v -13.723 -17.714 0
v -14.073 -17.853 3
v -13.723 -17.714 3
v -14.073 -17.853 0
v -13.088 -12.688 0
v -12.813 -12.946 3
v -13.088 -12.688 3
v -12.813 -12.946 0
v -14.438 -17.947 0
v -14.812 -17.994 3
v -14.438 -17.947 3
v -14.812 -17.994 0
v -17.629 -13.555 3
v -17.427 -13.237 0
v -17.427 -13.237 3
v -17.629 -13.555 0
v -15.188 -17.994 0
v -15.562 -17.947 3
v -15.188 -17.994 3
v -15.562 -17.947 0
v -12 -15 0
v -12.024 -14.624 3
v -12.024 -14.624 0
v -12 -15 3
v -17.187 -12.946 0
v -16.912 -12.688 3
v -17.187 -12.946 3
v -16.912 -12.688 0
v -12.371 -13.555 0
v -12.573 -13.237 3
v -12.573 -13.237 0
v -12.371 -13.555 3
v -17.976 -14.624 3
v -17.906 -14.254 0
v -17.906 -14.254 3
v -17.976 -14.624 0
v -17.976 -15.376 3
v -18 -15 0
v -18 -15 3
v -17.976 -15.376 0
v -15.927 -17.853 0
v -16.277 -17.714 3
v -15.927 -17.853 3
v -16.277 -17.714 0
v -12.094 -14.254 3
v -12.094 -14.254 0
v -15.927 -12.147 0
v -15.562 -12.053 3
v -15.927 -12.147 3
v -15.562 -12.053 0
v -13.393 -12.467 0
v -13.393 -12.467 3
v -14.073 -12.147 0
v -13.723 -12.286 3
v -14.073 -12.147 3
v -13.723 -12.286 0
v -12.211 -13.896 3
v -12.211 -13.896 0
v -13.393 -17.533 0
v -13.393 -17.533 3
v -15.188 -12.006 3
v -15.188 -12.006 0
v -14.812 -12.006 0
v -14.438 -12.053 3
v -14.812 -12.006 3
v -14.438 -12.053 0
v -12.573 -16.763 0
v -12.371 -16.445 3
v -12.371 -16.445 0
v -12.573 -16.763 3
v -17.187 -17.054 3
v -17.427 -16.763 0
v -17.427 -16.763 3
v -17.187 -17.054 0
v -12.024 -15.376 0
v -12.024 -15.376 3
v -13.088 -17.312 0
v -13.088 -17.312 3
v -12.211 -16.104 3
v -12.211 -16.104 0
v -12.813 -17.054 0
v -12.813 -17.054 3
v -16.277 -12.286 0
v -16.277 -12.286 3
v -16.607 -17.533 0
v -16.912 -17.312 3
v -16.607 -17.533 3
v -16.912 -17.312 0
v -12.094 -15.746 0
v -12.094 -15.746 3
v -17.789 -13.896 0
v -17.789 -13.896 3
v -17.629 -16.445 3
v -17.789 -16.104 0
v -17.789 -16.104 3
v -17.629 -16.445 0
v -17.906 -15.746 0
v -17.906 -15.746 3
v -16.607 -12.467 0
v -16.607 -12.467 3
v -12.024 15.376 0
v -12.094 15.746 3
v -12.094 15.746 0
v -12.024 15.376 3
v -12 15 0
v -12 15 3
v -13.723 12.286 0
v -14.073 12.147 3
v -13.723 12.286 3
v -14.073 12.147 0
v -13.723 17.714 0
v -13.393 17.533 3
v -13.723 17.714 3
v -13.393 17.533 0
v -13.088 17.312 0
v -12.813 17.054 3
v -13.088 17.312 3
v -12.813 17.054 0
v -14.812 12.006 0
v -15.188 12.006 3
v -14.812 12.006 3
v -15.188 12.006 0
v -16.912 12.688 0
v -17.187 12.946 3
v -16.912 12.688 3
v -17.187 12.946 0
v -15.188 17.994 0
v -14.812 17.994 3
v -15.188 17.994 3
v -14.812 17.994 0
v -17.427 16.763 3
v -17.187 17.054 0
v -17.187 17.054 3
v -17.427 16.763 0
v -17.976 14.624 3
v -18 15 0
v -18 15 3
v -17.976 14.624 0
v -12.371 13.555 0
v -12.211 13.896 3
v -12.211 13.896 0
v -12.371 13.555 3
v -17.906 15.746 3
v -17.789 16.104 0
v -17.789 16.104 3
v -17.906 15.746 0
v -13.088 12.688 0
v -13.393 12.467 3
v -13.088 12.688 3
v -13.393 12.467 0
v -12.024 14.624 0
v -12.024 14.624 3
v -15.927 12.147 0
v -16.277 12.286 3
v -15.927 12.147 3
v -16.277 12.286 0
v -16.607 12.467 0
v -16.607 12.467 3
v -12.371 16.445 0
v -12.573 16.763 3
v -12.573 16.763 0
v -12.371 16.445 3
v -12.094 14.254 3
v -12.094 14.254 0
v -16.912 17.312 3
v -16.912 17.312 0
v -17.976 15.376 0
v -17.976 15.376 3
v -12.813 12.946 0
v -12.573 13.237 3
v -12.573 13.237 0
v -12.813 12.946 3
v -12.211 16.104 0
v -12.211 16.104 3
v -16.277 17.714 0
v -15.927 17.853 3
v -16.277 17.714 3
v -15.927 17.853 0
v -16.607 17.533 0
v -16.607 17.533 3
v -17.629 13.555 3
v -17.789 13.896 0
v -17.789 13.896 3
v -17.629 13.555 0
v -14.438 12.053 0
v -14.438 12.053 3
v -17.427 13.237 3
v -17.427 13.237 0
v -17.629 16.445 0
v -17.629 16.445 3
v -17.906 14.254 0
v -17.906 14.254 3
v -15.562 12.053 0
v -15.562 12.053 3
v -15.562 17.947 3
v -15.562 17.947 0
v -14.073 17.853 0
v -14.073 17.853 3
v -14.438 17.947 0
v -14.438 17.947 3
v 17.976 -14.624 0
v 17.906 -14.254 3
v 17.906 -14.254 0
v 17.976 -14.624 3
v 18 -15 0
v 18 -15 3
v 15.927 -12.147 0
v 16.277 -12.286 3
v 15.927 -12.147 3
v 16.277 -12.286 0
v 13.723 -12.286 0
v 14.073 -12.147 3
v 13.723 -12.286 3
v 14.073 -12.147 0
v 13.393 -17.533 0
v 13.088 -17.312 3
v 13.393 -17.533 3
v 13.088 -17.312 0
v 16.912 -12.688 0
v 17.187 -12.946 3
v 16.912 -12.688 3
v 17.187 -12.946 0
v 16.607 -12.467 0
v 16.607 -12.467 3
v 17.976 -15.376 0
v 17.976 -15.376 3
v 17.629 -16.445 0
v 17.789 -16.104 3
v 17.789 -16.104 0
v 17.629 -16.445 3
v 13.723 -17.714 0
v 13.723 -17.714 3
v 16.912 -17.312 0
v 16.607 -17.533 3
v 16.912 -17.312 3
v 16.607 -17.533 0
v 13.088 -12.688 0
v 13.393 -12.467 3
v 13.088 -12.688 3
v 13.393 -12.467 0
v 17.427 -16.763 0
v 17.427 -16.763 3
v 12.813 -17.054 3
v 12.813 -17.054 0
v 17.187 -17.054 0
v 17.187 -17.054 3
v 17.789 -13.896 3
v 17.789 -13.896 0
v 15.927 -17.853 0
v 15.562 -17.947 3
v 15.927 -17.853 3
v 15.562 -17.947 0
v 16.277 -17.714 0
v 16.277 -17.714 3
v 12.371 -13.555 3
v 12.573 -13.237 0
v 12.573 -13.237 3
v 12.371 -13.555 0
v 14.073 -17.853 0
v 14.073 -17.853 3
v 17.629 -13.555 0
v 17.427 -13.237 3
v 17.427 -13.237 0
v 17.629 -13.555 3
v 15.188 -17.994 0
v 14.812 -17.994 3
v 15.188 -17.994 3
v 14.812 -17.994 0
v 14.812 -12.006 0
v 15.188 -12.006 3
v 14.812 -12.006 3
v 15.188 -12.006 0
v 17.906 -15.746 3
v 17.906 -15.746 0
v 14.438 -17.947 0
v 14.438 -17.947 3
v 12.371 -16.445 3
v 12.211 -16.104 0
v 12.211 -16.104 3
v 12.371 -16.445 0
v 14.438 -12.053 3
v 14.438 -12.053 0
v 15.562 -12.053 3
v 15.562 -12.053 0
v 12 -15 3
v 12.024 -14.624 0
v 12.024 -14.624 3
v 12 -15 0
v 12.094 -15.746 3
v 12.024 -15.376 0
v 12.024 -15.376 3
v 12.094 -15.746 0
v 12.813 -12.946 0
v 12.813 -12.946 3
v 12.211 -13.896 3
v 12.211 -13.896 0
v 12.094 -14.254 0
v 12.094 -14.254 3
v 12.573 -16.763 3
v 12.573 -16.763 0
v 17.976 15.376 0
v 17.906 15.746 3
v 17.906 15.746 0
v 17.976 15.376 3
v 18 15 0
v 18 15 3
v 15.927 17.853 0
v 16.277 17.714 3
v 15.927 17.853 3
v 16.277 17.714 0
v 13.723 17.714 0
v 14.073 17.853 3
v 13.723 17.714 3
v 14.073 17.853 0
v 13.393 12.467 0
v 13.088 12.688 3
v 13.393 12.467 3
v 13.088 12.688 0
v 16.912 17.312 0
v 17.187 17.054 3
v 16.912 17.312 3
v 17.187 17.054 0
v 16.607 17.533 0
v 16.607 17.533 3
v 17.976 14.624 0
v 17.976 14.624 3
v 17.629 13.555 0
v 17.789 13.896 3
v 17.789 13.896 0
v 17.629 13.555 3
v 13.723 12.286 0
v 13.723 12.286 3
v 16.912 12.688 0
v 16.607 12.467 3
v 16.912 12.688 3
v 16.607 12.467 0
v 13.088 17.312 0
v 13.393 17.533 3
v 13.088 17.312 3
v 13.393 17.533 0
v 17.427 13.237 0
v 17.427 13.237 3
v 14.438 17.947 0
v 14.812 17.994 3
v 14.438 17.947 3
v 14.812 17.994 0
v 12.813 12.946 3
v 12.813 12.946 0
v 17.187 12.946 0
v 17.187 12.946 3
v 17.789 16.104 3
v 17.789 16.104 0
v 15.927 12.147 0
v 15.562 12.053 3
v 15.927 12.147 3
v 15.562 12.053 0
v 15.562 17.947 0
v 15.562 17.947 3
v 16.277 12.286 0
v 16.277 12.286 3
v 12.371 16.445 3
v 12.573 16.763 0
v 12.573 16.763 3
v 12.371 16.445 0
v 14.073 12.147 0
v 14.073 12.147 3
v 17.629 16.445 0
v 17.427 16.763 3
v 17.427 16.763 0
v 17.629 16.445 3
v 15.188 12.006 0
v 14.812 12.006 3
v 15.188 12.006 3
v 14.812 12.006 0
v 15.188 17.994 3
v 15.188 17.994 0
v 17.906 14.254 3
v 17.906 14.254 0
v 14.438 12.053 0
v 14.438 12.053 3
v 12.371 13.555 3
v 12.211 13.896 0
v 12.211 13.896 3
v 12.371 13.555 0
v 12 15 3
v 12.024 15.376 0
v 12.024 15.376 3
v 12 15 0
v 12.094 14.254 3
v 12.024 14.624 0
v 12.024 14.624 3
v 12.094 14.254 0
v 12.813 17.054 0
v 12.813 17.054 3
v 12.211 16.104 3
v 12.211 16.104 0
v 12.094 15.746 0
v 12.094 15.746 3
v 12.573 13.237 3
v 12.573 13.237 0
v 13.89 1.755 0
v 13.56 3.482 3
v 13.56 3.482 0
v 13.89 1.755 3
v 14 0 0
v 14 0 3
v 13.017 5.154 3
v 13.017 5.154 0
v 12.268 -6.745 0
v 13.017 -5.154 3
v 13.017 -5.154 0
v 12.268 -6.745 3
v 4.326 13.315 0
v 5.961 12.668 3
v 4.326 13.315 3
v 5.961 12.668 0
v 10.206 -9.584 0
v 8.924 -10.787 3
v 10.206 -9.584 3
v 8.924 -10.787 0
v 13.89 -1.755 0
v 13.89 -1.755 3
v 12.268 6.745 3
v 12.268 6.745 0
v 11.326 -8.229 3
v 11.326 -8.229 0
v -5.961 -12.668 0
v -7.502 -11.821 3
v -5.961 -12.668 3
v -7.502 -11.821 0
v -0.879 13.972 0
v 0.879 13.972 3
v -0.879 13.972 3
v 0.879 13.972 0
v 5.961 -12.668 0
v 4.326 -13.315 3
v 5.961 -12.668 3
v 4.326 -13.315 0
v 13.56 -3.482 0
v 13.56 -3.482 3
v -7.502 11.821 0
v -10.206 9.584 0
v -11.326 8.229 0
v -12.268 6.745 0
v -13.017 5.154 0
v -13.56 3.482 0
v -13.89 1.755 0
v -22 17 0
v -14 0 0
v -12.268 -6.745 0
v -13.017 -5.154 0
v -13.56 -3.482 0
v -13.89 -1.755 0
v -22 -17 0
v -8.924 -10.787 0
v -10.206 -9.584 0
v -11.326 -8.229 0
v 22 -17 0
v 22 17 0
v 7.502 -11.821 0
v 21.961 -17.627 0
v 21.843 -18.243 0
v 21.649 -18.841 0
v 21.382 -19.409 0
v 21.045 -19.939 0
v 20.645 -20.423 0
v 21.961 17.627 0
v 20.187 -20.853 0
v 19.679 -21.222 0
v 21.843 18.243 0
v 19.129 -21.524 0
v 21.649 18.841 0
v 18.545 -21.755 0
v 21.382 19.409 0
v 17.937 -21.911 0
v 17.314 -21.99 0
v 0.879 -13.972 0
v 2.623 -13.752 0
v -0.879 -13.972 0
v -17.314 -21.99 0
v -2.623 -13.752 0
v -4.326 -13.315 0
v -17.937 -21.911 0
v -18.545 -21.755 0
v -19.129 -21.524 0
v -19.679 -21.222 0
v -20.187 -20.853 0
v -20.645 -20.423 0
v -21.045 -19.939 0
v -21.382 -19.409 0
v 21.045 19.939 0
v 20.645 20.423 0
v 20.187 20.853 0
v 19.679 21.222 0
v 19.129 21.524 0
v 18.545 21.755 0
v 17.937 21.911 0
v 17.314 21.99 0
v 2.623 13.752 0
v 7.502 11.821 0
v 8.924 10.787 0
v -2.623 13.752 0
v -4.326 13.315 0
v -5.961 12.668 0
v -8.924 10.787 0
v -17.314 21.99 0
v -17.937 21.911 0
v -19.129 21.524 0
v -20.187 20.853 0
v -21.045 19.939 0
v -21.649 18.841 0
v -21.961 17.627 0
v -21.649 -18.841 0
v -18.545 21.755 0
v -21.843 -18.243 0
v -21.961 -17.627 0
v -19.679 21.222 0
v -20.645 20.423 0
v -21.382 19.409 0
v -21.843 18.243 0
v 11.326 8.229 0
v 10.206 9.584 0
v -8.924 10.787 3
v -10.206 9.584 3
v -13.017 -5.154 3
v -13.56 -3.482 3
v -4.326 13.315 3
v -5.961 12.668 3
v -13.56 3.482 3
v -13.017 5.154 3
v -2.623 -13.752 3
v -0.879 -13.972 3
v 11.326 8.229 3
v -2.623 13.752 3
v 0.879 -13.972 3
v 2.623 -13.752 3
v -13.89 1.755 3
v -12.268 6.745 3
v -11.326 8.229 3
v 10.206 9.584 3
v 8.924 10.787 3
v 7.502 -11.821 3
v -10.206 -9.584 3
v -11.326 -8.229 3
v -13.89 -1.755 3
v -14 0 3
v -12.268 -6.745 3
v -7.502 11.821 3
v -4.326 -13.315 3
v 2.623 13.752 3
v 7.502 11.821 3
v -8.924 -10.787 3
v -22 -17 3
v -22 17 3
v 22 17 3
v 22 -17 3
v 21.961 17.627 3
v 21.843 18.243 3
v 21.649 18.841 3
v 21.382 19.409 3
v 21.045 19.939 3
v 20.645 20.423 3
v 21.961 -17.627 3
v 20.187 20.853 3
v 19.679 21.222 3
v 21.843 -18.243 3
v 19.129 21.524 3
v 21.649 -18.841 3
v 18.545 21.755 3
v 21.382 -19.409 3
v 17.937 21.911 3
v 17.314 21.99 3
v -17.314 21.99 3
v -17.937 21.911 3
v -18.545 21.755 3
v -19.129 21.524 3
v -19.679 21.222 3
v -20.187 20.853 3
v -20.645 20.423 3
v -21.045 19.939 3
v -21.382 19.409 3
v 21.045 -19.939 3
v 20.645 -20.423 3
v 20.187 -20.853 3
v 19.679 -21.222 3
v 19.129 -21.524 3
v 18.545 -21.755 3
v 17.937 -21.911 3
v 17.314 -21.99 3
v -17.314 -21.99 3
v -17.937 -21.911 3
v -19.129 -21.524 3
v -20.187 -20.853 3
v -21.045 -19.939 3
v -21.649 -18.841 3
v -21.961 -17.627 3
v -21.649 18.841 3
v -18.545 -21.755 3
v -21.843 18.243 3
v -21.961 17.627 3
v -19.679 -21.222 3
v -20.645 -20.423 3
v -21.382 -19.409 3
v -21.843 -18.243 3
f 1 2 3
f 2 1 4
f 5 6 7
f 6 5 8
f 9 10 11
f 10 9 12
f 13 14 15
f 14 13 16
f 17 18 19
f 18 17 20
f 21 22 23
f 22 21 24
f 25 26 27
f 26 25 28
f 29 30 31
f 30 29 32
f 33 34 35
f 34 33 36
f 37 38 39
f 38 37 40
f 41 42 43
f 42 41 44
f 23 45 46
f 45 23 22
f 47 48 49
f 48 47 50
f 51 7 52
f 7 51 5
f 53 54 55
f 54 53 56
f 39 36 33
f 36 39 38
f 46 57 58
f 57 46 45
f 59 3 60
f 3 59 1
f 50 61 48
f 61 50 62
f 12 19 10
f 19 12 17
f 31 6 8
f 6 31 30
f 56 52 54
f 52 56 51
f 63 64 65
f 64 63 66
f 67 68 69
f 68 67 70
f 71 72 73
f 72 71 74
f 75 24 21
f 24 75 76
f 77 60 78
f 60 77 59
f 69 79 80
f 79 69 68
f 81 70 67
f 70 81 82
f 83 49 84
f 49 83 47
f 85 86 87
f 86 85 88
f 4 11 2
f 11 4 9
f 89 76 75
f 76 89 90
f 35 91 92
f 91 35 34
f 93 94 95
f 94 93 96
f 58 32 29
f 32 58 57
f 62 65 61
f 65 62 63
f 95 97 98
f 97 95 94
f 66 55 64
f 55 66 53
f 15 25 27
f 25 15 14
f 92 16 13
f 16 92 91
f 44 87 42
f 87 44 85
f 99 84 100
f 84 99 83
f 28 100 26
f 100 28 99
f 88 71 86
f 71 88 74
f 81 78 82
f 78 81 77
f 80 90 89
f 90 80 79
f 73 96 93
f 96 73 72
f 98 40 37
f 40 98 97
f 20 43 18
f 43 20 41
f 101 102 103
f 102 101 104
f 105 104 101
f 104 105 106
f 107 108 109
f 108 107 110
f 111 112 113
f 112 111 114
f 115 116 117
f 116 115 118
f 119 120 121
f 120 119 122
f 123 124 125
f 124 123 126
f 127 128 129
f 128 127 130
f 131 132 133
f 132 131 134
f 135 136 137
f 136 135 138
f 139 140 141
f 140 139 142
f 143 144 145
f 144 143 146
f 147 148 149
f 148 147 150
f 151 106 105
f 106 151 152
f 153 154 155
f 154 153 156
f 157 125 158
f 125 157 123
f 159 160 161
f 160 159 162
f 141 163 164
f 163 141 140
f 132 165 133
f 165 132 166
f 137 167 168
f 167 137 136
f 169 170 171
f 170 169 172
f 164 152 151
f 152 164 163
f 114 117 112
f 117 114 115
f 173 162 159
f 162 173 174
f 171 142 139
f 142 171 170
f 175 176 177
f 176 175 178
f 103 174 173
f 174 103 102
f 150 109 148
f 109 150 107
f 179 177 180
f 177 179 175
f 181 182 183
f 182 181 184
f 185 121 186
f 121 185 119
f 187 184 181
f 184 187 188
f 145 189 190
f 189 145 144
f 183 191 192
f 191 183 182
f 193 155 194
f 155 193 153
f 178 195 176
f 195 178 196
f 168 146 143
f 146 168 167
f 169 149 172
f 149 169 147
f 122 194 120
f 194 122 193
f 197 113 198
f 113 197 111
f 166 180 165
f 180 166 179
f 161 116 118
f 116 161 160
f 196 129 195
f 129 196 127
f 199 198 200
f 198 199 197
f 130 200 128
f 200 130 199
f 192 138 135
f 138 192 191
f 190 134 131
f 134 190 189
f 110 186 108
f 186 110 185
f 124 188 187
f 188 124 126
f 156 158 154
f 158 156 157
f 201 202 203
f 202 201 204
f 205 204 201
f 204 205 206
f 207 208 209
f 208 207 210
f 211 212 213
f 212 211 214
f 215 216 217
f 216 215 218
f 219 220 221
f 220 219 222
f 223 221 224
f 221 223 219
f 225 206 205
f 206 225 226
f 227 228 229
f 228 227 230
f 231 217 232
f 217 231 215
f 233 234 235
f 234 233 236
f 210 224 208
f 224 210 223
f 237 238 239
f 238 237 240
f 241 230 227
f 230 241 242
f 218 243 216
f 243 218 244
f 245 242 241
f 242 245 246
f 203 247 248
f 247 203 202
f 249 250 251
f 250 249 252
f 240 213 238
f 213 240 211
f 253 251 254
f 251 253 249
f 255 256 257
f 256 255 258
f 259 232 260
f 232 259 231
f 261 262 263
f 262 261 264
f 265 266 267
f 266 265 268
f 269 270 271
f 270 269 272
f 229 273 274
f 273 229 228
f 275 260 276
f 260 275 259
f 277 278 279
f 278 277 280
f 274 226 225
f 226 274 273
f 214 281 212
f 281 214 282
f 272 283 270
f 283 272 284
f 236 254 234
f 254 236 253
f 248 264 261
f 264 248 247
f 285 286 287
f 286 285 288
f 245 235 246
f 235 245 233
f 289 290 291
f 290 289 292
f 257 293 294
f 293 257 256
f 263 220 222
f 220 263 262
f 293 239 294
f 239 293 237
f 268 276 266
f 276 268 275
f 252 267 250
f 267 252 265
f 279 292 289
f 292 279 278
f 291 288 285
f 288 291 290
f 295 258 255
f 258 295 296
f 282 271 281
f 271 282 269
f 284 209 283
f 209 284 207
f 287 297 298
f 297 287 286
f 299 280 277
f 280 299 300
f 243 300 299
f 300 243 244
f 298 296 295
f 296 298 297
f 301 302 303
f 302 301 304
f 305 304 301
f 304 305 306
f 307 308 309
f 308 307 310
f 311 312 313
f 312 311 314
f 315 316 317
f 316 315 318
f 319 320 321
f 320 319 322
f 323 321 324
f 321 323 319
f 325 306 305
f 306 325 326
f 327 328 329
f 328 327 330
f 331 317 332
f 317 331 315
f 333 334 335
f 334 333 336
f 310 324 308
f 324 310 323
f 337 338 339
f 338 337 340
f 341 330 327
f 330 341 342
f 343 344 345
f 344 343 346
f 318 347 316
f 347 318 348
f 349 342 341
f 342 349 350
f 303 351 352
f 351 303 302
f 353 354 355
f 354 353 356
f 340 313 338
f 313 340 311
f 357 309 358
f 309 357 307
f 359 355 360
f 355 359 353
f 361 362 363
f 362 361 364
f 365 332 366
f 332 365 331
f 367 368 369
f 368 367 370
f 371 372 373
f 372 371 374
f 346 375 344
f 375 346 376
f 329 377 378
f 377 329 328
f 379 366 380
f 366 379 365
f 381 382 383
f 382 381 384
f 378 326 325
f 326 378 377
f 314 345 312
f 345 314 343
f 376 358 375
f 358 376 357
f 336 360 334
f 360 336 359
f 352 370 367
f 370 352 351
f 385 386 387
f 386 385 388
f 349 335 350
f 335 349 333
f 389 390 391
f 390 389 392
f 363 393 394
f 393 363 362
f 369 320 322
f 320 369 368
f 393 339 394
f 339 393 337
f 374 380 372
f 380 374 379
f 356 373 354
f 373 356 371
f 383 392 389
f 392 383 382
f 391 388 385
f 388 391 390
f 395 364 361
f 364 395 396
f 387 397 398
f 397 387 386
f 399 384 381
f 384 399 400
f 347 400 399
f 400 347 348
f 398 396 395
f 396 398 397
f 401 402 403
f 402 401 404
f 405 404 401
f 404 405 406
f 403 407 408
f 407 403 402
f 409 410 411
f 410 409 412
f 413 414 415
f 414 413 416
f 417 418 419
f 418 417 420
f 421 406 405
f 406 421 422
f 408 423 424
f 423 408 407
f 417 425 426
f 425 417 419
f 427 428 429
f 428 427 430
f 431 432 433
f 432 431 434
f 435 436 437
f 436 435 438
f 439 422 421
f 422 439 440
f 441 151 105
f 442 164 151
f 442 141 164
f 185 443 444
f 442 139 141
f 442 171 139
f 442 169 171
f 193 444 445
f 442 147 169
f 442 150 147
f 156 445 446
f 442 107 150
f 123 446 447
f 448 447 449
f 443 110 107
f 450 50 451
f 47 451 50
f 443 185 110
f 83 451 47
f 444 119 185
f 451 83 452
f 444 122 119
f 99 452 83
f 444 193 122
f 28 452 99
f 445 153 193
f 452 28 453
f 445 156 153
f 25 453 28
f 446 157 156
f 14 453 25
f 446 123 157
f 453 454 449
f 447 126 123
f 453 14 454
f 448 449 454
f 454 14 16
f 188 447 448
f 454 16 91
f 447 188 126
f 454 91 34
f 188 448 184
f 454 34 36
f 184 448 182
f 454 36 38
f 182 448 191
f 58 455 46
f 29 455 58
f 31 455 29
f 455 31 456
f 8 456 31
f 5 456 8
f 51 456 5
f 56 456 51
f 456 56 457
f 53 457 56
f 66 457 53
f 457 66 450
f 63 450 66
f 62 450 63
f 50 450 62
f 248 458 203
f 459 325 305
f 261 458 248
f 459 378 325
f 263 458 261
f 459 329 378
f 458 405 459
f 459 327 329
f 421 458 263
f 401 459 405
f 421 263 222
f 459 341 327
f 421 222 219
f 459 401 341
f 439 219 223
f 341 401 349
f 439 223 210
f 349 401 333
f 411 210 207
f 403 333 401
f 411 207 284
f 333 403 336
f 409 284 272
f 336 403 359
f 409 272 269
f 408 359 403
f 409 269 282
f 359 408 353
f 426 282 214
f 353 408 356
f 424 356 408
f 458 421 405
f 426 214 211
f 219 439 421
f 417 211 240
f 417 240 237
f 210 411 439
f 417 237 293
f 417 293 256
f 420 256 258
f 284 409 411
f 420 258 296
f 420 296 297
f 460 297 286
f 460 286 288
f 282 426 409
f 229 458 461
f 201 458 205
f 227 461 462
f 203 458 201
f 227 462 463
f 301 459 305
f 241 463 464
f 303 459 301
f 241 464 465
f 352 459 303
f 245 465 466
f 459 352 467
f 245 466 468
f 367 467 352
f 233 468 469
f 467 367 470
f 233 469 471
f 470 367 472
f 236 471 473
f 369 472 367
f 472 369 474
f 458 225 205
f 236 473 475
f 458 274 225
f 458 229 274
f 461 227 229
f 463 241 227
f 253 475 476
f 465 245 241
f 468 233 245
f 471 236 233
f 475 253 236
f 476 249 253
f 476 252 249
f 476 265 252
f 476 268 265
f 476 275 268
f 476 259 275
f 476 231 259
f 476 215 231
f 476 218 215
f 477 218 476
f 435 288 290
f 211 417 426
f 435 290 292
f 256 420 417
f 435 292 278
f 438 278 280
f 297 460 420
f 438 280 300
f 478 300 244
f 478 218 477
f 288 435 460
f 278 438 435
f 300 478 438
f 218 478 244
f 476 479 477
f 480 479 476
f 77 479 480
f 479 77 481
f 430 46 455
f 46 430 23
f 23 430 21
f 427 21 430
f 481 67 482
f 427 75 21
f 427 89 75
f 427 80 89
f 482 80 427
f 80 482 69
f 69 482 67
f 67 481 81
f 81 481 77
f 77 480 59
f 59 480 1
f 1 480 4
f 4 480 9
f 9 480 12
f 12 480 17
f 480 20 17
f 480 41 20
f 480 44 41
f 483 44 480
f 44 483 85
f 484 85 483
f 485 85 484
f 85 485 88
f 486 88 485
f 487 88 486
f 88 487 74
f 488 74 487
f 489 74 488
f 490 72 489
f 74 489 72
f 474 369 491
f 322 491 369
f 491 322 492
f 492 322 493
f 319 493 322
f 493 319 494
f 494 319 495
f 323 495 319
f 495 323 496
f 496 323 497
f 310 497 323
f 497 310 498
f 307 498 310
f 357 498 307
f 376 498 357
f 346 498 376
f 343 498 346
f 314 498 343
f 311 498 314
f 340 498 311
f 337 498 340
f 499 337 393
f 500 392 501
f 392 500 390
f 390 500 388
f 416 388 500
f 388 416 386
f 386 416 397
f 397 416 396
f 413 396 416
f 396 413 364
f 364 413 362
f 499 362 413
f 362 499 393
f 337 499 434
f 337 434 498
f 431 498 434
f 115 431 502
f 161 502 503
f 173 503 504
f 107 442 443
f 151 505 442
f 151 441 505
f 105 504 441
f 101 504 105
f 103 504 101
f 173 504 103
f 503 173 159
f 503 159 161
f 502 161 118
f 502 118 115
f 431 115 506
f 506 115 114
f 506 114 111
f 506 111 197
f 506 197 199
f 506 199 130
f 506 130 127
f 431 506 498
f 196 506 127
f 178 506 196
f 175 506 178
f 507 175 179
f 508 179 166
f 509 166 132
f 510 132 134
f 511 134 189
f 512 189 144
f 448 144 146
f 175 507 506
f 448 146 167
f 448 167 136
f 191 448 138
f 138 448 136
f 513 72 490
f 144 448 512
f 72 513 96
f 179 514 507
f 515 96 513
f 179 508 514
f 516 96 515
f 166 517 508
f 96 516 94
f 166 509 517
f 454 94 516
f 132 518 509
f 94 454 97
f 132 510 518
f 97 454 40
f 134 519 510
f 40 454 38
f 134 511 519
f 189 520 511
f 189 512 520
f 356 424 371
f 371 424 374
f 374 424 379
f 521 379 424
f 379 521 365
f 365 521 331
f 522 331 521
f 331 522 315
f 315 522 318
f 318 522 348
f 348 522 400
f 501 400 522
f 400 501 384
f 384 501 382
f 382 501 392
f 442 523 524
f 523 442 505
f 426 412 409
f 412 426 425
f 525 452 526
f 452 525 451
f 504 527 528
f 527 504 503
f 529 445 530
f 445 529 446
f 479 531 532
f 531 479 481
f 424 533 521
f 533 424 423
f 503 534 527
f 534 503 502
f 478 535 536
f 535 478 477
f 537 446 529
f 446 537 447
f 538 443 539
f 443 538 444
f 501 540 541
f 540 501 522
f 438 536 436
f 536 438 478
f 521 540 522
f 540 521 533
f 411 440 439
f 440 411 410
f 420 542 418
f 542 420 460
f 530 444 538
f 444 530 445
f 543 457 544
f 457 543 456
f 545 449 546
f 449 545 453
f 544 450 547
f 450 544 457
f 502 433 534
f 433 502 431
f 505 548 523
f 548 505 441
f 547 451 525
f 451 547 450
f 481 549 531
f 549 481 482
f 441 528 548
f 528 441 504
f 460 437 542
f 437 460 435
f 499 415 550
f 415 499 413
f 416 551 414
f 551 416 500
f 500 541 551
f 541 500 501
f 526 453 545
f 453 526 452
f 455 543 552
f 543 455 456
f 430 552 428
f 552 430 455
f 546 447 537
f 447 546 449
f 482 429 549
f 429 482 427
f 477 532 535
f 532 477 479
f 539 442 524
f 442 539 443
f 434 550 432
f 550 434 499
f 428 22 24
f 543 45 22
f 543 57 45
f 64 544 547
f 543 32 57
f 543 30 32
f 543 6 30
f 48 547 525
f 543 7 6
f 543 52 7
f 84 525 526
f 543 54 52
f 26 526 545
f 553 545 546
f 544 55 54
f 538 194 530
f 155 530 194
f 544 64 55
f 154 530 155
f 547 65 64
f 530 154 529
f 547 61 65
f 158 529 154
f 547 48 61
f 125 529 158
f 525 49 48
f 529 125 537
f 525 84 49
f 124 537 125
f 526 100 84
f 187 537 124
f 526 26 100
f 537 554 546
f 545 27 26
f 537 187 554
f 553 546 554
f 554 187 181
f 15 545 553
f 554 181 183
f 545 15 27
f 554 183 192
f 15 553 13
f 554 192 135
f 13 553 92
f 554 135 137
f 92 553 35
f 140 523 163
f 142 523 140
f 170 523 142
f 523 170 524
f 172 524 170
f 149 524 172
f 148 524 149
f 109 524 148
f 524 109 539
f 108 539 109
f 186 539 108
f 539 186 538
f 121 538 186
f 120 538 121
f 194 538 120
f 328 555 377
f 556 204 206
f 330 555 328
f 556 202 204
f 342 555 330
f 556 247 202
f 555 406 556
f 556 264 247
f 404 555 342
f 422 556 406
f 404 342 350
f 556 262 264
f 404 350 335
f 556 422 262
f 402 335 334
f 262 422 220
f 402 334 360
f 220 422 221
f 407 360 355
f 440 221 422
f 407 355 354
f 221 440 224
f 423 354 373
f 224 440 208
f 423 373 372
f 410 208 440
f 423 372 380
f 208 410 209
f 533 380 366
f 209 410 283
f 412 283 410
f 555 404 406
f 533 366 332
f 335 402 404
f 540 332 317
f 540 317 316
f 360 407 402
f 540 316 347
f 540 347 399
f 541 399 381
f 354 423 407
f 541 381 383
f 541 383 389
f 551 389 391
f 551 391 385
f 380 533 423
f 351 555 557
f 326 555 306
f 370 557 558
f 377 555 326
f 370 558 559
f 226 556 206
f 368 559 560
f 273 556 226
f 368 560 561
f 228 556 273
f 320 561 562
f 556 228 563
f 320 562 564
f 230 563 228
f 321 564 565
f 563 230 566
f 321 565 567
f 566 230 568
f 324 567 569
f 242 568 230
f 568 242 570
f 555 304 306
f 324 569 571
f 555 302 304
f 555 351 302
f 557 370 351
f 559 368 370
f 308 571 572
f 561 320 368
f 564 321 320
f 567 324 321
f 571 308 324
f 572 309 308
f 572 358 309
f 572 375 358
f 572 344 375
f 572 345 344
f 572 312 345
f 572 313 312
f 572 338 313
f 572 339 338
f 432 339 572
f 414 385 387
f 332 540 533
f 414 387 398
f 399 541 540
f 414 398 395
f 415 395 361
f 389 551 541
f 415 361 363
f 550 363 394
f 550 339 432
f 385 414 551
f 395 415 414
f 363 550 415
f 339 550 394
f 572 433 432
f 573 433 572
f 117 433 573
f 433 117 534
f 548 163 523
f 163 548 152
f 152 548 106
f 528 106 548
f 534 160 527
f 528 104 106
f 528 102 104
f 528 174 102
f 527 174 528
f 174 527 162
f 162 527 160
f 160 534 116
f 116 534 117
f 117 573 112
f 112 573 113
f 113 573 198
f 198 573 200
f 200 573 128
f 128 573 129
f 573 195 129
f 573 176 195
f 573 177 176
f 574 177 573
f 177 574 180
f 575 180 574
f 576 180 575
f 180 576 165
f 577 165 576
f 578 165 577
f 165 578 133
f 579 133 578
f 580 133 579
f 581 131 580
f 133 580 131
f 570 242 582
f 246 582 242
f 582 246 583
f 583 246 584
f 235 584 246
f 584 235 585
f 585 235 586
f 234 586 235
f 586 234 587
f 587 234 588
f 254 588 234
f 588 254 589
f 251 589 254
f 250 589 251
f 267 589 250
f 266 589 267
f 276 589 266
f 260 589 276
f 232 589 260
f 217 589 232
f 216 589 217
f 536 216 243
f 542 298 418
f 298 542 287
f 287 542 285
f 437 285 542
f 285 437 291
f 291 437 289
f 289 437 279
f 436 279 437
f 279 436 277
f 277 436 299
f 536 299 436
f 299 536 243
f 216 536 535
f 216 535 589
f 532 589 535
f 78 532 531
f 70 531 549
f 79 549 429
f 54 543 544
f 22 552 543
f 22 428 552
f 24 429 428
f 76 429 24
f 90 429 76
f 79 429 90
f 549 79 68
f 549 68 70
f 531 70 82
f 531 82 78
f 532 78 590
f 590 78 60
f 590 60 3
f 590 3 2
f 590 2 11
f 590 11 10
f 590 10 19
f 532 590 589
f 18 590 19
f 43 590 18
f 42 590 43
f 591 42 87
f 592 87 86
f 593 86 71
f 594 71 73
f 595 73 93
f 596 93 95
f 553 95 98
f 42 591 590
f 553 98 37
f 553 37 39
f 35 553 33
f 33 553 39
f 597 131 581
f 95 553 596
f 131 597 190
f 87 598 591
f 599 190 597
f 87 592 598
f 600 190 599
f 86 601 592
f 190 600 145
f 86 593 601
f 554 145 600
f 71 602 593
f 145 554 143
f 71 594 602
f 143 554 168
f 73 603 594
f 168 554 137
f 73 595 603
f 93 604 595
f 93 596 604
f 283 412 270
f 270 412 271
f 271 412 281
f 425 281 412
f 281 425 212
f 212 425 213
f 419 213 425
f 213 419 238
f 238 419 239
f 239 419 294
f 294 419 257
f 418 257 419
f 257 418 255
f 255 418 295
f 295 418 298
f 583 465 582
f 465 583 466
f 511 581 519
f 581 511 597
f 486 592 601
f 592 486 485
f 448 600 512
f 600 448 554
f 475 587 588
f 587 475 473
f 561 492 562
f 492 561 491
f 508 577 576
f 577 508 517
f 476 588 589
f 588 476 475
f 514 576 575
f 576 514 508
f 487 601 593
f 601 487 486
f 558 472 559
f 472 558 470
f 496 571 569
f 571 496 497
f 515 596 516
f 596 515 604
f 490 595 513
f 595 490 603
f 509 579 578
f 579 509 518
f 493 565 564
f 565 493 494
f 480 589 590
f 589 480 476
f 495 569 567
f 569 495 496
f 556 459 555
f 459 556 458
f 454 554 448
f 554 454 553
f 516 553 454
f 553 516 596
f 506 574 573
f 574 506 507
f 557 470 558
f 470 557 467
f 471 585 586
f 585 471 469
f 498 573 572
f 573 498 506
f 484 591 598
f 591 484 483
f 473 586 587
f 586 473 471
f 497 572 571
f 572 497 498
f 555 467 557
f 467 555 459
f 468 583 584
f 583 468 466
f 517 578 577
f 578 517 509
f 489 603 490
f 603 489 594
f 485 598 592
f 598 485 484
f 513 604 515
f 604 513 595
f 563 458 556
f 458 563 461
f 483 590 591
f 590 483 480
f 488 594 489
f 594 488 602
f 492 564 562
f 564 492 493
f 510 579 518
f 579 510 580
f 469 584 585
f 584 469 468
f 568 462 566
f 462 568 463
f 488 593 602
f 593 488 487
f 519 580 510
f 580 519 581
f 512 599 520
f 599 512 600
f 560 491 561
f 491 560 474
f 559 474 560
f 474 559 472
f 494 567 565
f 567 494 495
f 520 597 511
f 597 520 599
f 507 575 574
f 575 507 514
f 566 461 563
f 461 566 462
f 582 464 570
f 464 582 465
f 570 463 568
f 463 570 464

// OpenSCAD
$fn = 50;


difference() {
	union() {
		hull() {
			translate(v = [-17.0000000000, 17.0000000000, 0]) {
				cylinder(h = 3, r = 5);
			}
			translate(v = [17.0000000000, 17.0000000000, 0]) {
				cylinder(h = 3, r = 5);
			}
			translate(v = [-17.0000000000, -17.0000000000, 0]) {
				cylinder(h = 3, r = 5);
			}
			translate(v = [17.0000000000, -17.0000000000, 0]) {
				cylinder(h = 3, r = 5);
			}
		}
	}
	union() {
		#translate(v = [-15.0000000000, -15.0000000000, -100.0000000000]) {
			cylinder(h = 200, r = 3.0000000000);
		}
		#translate(v = [-15.0000000000, 15.0000000000, -100.0000000000]) {
			cylinder(h = 200, r = 3.0000000000);
		}
		#translate(v = [15.0000000000, -15.0000000000, -100.0000000000]) {
			cylinder(h = 200, r = 3.0000000000);
		}
		#translate(v = [15.0000000000, 15.0000000000, -100.0000000000]) {
			cylinder(h = 200, r = 3.0000000000);
		}
		#cylinder(h = 3, r = 14.0000000000);
	}
}
